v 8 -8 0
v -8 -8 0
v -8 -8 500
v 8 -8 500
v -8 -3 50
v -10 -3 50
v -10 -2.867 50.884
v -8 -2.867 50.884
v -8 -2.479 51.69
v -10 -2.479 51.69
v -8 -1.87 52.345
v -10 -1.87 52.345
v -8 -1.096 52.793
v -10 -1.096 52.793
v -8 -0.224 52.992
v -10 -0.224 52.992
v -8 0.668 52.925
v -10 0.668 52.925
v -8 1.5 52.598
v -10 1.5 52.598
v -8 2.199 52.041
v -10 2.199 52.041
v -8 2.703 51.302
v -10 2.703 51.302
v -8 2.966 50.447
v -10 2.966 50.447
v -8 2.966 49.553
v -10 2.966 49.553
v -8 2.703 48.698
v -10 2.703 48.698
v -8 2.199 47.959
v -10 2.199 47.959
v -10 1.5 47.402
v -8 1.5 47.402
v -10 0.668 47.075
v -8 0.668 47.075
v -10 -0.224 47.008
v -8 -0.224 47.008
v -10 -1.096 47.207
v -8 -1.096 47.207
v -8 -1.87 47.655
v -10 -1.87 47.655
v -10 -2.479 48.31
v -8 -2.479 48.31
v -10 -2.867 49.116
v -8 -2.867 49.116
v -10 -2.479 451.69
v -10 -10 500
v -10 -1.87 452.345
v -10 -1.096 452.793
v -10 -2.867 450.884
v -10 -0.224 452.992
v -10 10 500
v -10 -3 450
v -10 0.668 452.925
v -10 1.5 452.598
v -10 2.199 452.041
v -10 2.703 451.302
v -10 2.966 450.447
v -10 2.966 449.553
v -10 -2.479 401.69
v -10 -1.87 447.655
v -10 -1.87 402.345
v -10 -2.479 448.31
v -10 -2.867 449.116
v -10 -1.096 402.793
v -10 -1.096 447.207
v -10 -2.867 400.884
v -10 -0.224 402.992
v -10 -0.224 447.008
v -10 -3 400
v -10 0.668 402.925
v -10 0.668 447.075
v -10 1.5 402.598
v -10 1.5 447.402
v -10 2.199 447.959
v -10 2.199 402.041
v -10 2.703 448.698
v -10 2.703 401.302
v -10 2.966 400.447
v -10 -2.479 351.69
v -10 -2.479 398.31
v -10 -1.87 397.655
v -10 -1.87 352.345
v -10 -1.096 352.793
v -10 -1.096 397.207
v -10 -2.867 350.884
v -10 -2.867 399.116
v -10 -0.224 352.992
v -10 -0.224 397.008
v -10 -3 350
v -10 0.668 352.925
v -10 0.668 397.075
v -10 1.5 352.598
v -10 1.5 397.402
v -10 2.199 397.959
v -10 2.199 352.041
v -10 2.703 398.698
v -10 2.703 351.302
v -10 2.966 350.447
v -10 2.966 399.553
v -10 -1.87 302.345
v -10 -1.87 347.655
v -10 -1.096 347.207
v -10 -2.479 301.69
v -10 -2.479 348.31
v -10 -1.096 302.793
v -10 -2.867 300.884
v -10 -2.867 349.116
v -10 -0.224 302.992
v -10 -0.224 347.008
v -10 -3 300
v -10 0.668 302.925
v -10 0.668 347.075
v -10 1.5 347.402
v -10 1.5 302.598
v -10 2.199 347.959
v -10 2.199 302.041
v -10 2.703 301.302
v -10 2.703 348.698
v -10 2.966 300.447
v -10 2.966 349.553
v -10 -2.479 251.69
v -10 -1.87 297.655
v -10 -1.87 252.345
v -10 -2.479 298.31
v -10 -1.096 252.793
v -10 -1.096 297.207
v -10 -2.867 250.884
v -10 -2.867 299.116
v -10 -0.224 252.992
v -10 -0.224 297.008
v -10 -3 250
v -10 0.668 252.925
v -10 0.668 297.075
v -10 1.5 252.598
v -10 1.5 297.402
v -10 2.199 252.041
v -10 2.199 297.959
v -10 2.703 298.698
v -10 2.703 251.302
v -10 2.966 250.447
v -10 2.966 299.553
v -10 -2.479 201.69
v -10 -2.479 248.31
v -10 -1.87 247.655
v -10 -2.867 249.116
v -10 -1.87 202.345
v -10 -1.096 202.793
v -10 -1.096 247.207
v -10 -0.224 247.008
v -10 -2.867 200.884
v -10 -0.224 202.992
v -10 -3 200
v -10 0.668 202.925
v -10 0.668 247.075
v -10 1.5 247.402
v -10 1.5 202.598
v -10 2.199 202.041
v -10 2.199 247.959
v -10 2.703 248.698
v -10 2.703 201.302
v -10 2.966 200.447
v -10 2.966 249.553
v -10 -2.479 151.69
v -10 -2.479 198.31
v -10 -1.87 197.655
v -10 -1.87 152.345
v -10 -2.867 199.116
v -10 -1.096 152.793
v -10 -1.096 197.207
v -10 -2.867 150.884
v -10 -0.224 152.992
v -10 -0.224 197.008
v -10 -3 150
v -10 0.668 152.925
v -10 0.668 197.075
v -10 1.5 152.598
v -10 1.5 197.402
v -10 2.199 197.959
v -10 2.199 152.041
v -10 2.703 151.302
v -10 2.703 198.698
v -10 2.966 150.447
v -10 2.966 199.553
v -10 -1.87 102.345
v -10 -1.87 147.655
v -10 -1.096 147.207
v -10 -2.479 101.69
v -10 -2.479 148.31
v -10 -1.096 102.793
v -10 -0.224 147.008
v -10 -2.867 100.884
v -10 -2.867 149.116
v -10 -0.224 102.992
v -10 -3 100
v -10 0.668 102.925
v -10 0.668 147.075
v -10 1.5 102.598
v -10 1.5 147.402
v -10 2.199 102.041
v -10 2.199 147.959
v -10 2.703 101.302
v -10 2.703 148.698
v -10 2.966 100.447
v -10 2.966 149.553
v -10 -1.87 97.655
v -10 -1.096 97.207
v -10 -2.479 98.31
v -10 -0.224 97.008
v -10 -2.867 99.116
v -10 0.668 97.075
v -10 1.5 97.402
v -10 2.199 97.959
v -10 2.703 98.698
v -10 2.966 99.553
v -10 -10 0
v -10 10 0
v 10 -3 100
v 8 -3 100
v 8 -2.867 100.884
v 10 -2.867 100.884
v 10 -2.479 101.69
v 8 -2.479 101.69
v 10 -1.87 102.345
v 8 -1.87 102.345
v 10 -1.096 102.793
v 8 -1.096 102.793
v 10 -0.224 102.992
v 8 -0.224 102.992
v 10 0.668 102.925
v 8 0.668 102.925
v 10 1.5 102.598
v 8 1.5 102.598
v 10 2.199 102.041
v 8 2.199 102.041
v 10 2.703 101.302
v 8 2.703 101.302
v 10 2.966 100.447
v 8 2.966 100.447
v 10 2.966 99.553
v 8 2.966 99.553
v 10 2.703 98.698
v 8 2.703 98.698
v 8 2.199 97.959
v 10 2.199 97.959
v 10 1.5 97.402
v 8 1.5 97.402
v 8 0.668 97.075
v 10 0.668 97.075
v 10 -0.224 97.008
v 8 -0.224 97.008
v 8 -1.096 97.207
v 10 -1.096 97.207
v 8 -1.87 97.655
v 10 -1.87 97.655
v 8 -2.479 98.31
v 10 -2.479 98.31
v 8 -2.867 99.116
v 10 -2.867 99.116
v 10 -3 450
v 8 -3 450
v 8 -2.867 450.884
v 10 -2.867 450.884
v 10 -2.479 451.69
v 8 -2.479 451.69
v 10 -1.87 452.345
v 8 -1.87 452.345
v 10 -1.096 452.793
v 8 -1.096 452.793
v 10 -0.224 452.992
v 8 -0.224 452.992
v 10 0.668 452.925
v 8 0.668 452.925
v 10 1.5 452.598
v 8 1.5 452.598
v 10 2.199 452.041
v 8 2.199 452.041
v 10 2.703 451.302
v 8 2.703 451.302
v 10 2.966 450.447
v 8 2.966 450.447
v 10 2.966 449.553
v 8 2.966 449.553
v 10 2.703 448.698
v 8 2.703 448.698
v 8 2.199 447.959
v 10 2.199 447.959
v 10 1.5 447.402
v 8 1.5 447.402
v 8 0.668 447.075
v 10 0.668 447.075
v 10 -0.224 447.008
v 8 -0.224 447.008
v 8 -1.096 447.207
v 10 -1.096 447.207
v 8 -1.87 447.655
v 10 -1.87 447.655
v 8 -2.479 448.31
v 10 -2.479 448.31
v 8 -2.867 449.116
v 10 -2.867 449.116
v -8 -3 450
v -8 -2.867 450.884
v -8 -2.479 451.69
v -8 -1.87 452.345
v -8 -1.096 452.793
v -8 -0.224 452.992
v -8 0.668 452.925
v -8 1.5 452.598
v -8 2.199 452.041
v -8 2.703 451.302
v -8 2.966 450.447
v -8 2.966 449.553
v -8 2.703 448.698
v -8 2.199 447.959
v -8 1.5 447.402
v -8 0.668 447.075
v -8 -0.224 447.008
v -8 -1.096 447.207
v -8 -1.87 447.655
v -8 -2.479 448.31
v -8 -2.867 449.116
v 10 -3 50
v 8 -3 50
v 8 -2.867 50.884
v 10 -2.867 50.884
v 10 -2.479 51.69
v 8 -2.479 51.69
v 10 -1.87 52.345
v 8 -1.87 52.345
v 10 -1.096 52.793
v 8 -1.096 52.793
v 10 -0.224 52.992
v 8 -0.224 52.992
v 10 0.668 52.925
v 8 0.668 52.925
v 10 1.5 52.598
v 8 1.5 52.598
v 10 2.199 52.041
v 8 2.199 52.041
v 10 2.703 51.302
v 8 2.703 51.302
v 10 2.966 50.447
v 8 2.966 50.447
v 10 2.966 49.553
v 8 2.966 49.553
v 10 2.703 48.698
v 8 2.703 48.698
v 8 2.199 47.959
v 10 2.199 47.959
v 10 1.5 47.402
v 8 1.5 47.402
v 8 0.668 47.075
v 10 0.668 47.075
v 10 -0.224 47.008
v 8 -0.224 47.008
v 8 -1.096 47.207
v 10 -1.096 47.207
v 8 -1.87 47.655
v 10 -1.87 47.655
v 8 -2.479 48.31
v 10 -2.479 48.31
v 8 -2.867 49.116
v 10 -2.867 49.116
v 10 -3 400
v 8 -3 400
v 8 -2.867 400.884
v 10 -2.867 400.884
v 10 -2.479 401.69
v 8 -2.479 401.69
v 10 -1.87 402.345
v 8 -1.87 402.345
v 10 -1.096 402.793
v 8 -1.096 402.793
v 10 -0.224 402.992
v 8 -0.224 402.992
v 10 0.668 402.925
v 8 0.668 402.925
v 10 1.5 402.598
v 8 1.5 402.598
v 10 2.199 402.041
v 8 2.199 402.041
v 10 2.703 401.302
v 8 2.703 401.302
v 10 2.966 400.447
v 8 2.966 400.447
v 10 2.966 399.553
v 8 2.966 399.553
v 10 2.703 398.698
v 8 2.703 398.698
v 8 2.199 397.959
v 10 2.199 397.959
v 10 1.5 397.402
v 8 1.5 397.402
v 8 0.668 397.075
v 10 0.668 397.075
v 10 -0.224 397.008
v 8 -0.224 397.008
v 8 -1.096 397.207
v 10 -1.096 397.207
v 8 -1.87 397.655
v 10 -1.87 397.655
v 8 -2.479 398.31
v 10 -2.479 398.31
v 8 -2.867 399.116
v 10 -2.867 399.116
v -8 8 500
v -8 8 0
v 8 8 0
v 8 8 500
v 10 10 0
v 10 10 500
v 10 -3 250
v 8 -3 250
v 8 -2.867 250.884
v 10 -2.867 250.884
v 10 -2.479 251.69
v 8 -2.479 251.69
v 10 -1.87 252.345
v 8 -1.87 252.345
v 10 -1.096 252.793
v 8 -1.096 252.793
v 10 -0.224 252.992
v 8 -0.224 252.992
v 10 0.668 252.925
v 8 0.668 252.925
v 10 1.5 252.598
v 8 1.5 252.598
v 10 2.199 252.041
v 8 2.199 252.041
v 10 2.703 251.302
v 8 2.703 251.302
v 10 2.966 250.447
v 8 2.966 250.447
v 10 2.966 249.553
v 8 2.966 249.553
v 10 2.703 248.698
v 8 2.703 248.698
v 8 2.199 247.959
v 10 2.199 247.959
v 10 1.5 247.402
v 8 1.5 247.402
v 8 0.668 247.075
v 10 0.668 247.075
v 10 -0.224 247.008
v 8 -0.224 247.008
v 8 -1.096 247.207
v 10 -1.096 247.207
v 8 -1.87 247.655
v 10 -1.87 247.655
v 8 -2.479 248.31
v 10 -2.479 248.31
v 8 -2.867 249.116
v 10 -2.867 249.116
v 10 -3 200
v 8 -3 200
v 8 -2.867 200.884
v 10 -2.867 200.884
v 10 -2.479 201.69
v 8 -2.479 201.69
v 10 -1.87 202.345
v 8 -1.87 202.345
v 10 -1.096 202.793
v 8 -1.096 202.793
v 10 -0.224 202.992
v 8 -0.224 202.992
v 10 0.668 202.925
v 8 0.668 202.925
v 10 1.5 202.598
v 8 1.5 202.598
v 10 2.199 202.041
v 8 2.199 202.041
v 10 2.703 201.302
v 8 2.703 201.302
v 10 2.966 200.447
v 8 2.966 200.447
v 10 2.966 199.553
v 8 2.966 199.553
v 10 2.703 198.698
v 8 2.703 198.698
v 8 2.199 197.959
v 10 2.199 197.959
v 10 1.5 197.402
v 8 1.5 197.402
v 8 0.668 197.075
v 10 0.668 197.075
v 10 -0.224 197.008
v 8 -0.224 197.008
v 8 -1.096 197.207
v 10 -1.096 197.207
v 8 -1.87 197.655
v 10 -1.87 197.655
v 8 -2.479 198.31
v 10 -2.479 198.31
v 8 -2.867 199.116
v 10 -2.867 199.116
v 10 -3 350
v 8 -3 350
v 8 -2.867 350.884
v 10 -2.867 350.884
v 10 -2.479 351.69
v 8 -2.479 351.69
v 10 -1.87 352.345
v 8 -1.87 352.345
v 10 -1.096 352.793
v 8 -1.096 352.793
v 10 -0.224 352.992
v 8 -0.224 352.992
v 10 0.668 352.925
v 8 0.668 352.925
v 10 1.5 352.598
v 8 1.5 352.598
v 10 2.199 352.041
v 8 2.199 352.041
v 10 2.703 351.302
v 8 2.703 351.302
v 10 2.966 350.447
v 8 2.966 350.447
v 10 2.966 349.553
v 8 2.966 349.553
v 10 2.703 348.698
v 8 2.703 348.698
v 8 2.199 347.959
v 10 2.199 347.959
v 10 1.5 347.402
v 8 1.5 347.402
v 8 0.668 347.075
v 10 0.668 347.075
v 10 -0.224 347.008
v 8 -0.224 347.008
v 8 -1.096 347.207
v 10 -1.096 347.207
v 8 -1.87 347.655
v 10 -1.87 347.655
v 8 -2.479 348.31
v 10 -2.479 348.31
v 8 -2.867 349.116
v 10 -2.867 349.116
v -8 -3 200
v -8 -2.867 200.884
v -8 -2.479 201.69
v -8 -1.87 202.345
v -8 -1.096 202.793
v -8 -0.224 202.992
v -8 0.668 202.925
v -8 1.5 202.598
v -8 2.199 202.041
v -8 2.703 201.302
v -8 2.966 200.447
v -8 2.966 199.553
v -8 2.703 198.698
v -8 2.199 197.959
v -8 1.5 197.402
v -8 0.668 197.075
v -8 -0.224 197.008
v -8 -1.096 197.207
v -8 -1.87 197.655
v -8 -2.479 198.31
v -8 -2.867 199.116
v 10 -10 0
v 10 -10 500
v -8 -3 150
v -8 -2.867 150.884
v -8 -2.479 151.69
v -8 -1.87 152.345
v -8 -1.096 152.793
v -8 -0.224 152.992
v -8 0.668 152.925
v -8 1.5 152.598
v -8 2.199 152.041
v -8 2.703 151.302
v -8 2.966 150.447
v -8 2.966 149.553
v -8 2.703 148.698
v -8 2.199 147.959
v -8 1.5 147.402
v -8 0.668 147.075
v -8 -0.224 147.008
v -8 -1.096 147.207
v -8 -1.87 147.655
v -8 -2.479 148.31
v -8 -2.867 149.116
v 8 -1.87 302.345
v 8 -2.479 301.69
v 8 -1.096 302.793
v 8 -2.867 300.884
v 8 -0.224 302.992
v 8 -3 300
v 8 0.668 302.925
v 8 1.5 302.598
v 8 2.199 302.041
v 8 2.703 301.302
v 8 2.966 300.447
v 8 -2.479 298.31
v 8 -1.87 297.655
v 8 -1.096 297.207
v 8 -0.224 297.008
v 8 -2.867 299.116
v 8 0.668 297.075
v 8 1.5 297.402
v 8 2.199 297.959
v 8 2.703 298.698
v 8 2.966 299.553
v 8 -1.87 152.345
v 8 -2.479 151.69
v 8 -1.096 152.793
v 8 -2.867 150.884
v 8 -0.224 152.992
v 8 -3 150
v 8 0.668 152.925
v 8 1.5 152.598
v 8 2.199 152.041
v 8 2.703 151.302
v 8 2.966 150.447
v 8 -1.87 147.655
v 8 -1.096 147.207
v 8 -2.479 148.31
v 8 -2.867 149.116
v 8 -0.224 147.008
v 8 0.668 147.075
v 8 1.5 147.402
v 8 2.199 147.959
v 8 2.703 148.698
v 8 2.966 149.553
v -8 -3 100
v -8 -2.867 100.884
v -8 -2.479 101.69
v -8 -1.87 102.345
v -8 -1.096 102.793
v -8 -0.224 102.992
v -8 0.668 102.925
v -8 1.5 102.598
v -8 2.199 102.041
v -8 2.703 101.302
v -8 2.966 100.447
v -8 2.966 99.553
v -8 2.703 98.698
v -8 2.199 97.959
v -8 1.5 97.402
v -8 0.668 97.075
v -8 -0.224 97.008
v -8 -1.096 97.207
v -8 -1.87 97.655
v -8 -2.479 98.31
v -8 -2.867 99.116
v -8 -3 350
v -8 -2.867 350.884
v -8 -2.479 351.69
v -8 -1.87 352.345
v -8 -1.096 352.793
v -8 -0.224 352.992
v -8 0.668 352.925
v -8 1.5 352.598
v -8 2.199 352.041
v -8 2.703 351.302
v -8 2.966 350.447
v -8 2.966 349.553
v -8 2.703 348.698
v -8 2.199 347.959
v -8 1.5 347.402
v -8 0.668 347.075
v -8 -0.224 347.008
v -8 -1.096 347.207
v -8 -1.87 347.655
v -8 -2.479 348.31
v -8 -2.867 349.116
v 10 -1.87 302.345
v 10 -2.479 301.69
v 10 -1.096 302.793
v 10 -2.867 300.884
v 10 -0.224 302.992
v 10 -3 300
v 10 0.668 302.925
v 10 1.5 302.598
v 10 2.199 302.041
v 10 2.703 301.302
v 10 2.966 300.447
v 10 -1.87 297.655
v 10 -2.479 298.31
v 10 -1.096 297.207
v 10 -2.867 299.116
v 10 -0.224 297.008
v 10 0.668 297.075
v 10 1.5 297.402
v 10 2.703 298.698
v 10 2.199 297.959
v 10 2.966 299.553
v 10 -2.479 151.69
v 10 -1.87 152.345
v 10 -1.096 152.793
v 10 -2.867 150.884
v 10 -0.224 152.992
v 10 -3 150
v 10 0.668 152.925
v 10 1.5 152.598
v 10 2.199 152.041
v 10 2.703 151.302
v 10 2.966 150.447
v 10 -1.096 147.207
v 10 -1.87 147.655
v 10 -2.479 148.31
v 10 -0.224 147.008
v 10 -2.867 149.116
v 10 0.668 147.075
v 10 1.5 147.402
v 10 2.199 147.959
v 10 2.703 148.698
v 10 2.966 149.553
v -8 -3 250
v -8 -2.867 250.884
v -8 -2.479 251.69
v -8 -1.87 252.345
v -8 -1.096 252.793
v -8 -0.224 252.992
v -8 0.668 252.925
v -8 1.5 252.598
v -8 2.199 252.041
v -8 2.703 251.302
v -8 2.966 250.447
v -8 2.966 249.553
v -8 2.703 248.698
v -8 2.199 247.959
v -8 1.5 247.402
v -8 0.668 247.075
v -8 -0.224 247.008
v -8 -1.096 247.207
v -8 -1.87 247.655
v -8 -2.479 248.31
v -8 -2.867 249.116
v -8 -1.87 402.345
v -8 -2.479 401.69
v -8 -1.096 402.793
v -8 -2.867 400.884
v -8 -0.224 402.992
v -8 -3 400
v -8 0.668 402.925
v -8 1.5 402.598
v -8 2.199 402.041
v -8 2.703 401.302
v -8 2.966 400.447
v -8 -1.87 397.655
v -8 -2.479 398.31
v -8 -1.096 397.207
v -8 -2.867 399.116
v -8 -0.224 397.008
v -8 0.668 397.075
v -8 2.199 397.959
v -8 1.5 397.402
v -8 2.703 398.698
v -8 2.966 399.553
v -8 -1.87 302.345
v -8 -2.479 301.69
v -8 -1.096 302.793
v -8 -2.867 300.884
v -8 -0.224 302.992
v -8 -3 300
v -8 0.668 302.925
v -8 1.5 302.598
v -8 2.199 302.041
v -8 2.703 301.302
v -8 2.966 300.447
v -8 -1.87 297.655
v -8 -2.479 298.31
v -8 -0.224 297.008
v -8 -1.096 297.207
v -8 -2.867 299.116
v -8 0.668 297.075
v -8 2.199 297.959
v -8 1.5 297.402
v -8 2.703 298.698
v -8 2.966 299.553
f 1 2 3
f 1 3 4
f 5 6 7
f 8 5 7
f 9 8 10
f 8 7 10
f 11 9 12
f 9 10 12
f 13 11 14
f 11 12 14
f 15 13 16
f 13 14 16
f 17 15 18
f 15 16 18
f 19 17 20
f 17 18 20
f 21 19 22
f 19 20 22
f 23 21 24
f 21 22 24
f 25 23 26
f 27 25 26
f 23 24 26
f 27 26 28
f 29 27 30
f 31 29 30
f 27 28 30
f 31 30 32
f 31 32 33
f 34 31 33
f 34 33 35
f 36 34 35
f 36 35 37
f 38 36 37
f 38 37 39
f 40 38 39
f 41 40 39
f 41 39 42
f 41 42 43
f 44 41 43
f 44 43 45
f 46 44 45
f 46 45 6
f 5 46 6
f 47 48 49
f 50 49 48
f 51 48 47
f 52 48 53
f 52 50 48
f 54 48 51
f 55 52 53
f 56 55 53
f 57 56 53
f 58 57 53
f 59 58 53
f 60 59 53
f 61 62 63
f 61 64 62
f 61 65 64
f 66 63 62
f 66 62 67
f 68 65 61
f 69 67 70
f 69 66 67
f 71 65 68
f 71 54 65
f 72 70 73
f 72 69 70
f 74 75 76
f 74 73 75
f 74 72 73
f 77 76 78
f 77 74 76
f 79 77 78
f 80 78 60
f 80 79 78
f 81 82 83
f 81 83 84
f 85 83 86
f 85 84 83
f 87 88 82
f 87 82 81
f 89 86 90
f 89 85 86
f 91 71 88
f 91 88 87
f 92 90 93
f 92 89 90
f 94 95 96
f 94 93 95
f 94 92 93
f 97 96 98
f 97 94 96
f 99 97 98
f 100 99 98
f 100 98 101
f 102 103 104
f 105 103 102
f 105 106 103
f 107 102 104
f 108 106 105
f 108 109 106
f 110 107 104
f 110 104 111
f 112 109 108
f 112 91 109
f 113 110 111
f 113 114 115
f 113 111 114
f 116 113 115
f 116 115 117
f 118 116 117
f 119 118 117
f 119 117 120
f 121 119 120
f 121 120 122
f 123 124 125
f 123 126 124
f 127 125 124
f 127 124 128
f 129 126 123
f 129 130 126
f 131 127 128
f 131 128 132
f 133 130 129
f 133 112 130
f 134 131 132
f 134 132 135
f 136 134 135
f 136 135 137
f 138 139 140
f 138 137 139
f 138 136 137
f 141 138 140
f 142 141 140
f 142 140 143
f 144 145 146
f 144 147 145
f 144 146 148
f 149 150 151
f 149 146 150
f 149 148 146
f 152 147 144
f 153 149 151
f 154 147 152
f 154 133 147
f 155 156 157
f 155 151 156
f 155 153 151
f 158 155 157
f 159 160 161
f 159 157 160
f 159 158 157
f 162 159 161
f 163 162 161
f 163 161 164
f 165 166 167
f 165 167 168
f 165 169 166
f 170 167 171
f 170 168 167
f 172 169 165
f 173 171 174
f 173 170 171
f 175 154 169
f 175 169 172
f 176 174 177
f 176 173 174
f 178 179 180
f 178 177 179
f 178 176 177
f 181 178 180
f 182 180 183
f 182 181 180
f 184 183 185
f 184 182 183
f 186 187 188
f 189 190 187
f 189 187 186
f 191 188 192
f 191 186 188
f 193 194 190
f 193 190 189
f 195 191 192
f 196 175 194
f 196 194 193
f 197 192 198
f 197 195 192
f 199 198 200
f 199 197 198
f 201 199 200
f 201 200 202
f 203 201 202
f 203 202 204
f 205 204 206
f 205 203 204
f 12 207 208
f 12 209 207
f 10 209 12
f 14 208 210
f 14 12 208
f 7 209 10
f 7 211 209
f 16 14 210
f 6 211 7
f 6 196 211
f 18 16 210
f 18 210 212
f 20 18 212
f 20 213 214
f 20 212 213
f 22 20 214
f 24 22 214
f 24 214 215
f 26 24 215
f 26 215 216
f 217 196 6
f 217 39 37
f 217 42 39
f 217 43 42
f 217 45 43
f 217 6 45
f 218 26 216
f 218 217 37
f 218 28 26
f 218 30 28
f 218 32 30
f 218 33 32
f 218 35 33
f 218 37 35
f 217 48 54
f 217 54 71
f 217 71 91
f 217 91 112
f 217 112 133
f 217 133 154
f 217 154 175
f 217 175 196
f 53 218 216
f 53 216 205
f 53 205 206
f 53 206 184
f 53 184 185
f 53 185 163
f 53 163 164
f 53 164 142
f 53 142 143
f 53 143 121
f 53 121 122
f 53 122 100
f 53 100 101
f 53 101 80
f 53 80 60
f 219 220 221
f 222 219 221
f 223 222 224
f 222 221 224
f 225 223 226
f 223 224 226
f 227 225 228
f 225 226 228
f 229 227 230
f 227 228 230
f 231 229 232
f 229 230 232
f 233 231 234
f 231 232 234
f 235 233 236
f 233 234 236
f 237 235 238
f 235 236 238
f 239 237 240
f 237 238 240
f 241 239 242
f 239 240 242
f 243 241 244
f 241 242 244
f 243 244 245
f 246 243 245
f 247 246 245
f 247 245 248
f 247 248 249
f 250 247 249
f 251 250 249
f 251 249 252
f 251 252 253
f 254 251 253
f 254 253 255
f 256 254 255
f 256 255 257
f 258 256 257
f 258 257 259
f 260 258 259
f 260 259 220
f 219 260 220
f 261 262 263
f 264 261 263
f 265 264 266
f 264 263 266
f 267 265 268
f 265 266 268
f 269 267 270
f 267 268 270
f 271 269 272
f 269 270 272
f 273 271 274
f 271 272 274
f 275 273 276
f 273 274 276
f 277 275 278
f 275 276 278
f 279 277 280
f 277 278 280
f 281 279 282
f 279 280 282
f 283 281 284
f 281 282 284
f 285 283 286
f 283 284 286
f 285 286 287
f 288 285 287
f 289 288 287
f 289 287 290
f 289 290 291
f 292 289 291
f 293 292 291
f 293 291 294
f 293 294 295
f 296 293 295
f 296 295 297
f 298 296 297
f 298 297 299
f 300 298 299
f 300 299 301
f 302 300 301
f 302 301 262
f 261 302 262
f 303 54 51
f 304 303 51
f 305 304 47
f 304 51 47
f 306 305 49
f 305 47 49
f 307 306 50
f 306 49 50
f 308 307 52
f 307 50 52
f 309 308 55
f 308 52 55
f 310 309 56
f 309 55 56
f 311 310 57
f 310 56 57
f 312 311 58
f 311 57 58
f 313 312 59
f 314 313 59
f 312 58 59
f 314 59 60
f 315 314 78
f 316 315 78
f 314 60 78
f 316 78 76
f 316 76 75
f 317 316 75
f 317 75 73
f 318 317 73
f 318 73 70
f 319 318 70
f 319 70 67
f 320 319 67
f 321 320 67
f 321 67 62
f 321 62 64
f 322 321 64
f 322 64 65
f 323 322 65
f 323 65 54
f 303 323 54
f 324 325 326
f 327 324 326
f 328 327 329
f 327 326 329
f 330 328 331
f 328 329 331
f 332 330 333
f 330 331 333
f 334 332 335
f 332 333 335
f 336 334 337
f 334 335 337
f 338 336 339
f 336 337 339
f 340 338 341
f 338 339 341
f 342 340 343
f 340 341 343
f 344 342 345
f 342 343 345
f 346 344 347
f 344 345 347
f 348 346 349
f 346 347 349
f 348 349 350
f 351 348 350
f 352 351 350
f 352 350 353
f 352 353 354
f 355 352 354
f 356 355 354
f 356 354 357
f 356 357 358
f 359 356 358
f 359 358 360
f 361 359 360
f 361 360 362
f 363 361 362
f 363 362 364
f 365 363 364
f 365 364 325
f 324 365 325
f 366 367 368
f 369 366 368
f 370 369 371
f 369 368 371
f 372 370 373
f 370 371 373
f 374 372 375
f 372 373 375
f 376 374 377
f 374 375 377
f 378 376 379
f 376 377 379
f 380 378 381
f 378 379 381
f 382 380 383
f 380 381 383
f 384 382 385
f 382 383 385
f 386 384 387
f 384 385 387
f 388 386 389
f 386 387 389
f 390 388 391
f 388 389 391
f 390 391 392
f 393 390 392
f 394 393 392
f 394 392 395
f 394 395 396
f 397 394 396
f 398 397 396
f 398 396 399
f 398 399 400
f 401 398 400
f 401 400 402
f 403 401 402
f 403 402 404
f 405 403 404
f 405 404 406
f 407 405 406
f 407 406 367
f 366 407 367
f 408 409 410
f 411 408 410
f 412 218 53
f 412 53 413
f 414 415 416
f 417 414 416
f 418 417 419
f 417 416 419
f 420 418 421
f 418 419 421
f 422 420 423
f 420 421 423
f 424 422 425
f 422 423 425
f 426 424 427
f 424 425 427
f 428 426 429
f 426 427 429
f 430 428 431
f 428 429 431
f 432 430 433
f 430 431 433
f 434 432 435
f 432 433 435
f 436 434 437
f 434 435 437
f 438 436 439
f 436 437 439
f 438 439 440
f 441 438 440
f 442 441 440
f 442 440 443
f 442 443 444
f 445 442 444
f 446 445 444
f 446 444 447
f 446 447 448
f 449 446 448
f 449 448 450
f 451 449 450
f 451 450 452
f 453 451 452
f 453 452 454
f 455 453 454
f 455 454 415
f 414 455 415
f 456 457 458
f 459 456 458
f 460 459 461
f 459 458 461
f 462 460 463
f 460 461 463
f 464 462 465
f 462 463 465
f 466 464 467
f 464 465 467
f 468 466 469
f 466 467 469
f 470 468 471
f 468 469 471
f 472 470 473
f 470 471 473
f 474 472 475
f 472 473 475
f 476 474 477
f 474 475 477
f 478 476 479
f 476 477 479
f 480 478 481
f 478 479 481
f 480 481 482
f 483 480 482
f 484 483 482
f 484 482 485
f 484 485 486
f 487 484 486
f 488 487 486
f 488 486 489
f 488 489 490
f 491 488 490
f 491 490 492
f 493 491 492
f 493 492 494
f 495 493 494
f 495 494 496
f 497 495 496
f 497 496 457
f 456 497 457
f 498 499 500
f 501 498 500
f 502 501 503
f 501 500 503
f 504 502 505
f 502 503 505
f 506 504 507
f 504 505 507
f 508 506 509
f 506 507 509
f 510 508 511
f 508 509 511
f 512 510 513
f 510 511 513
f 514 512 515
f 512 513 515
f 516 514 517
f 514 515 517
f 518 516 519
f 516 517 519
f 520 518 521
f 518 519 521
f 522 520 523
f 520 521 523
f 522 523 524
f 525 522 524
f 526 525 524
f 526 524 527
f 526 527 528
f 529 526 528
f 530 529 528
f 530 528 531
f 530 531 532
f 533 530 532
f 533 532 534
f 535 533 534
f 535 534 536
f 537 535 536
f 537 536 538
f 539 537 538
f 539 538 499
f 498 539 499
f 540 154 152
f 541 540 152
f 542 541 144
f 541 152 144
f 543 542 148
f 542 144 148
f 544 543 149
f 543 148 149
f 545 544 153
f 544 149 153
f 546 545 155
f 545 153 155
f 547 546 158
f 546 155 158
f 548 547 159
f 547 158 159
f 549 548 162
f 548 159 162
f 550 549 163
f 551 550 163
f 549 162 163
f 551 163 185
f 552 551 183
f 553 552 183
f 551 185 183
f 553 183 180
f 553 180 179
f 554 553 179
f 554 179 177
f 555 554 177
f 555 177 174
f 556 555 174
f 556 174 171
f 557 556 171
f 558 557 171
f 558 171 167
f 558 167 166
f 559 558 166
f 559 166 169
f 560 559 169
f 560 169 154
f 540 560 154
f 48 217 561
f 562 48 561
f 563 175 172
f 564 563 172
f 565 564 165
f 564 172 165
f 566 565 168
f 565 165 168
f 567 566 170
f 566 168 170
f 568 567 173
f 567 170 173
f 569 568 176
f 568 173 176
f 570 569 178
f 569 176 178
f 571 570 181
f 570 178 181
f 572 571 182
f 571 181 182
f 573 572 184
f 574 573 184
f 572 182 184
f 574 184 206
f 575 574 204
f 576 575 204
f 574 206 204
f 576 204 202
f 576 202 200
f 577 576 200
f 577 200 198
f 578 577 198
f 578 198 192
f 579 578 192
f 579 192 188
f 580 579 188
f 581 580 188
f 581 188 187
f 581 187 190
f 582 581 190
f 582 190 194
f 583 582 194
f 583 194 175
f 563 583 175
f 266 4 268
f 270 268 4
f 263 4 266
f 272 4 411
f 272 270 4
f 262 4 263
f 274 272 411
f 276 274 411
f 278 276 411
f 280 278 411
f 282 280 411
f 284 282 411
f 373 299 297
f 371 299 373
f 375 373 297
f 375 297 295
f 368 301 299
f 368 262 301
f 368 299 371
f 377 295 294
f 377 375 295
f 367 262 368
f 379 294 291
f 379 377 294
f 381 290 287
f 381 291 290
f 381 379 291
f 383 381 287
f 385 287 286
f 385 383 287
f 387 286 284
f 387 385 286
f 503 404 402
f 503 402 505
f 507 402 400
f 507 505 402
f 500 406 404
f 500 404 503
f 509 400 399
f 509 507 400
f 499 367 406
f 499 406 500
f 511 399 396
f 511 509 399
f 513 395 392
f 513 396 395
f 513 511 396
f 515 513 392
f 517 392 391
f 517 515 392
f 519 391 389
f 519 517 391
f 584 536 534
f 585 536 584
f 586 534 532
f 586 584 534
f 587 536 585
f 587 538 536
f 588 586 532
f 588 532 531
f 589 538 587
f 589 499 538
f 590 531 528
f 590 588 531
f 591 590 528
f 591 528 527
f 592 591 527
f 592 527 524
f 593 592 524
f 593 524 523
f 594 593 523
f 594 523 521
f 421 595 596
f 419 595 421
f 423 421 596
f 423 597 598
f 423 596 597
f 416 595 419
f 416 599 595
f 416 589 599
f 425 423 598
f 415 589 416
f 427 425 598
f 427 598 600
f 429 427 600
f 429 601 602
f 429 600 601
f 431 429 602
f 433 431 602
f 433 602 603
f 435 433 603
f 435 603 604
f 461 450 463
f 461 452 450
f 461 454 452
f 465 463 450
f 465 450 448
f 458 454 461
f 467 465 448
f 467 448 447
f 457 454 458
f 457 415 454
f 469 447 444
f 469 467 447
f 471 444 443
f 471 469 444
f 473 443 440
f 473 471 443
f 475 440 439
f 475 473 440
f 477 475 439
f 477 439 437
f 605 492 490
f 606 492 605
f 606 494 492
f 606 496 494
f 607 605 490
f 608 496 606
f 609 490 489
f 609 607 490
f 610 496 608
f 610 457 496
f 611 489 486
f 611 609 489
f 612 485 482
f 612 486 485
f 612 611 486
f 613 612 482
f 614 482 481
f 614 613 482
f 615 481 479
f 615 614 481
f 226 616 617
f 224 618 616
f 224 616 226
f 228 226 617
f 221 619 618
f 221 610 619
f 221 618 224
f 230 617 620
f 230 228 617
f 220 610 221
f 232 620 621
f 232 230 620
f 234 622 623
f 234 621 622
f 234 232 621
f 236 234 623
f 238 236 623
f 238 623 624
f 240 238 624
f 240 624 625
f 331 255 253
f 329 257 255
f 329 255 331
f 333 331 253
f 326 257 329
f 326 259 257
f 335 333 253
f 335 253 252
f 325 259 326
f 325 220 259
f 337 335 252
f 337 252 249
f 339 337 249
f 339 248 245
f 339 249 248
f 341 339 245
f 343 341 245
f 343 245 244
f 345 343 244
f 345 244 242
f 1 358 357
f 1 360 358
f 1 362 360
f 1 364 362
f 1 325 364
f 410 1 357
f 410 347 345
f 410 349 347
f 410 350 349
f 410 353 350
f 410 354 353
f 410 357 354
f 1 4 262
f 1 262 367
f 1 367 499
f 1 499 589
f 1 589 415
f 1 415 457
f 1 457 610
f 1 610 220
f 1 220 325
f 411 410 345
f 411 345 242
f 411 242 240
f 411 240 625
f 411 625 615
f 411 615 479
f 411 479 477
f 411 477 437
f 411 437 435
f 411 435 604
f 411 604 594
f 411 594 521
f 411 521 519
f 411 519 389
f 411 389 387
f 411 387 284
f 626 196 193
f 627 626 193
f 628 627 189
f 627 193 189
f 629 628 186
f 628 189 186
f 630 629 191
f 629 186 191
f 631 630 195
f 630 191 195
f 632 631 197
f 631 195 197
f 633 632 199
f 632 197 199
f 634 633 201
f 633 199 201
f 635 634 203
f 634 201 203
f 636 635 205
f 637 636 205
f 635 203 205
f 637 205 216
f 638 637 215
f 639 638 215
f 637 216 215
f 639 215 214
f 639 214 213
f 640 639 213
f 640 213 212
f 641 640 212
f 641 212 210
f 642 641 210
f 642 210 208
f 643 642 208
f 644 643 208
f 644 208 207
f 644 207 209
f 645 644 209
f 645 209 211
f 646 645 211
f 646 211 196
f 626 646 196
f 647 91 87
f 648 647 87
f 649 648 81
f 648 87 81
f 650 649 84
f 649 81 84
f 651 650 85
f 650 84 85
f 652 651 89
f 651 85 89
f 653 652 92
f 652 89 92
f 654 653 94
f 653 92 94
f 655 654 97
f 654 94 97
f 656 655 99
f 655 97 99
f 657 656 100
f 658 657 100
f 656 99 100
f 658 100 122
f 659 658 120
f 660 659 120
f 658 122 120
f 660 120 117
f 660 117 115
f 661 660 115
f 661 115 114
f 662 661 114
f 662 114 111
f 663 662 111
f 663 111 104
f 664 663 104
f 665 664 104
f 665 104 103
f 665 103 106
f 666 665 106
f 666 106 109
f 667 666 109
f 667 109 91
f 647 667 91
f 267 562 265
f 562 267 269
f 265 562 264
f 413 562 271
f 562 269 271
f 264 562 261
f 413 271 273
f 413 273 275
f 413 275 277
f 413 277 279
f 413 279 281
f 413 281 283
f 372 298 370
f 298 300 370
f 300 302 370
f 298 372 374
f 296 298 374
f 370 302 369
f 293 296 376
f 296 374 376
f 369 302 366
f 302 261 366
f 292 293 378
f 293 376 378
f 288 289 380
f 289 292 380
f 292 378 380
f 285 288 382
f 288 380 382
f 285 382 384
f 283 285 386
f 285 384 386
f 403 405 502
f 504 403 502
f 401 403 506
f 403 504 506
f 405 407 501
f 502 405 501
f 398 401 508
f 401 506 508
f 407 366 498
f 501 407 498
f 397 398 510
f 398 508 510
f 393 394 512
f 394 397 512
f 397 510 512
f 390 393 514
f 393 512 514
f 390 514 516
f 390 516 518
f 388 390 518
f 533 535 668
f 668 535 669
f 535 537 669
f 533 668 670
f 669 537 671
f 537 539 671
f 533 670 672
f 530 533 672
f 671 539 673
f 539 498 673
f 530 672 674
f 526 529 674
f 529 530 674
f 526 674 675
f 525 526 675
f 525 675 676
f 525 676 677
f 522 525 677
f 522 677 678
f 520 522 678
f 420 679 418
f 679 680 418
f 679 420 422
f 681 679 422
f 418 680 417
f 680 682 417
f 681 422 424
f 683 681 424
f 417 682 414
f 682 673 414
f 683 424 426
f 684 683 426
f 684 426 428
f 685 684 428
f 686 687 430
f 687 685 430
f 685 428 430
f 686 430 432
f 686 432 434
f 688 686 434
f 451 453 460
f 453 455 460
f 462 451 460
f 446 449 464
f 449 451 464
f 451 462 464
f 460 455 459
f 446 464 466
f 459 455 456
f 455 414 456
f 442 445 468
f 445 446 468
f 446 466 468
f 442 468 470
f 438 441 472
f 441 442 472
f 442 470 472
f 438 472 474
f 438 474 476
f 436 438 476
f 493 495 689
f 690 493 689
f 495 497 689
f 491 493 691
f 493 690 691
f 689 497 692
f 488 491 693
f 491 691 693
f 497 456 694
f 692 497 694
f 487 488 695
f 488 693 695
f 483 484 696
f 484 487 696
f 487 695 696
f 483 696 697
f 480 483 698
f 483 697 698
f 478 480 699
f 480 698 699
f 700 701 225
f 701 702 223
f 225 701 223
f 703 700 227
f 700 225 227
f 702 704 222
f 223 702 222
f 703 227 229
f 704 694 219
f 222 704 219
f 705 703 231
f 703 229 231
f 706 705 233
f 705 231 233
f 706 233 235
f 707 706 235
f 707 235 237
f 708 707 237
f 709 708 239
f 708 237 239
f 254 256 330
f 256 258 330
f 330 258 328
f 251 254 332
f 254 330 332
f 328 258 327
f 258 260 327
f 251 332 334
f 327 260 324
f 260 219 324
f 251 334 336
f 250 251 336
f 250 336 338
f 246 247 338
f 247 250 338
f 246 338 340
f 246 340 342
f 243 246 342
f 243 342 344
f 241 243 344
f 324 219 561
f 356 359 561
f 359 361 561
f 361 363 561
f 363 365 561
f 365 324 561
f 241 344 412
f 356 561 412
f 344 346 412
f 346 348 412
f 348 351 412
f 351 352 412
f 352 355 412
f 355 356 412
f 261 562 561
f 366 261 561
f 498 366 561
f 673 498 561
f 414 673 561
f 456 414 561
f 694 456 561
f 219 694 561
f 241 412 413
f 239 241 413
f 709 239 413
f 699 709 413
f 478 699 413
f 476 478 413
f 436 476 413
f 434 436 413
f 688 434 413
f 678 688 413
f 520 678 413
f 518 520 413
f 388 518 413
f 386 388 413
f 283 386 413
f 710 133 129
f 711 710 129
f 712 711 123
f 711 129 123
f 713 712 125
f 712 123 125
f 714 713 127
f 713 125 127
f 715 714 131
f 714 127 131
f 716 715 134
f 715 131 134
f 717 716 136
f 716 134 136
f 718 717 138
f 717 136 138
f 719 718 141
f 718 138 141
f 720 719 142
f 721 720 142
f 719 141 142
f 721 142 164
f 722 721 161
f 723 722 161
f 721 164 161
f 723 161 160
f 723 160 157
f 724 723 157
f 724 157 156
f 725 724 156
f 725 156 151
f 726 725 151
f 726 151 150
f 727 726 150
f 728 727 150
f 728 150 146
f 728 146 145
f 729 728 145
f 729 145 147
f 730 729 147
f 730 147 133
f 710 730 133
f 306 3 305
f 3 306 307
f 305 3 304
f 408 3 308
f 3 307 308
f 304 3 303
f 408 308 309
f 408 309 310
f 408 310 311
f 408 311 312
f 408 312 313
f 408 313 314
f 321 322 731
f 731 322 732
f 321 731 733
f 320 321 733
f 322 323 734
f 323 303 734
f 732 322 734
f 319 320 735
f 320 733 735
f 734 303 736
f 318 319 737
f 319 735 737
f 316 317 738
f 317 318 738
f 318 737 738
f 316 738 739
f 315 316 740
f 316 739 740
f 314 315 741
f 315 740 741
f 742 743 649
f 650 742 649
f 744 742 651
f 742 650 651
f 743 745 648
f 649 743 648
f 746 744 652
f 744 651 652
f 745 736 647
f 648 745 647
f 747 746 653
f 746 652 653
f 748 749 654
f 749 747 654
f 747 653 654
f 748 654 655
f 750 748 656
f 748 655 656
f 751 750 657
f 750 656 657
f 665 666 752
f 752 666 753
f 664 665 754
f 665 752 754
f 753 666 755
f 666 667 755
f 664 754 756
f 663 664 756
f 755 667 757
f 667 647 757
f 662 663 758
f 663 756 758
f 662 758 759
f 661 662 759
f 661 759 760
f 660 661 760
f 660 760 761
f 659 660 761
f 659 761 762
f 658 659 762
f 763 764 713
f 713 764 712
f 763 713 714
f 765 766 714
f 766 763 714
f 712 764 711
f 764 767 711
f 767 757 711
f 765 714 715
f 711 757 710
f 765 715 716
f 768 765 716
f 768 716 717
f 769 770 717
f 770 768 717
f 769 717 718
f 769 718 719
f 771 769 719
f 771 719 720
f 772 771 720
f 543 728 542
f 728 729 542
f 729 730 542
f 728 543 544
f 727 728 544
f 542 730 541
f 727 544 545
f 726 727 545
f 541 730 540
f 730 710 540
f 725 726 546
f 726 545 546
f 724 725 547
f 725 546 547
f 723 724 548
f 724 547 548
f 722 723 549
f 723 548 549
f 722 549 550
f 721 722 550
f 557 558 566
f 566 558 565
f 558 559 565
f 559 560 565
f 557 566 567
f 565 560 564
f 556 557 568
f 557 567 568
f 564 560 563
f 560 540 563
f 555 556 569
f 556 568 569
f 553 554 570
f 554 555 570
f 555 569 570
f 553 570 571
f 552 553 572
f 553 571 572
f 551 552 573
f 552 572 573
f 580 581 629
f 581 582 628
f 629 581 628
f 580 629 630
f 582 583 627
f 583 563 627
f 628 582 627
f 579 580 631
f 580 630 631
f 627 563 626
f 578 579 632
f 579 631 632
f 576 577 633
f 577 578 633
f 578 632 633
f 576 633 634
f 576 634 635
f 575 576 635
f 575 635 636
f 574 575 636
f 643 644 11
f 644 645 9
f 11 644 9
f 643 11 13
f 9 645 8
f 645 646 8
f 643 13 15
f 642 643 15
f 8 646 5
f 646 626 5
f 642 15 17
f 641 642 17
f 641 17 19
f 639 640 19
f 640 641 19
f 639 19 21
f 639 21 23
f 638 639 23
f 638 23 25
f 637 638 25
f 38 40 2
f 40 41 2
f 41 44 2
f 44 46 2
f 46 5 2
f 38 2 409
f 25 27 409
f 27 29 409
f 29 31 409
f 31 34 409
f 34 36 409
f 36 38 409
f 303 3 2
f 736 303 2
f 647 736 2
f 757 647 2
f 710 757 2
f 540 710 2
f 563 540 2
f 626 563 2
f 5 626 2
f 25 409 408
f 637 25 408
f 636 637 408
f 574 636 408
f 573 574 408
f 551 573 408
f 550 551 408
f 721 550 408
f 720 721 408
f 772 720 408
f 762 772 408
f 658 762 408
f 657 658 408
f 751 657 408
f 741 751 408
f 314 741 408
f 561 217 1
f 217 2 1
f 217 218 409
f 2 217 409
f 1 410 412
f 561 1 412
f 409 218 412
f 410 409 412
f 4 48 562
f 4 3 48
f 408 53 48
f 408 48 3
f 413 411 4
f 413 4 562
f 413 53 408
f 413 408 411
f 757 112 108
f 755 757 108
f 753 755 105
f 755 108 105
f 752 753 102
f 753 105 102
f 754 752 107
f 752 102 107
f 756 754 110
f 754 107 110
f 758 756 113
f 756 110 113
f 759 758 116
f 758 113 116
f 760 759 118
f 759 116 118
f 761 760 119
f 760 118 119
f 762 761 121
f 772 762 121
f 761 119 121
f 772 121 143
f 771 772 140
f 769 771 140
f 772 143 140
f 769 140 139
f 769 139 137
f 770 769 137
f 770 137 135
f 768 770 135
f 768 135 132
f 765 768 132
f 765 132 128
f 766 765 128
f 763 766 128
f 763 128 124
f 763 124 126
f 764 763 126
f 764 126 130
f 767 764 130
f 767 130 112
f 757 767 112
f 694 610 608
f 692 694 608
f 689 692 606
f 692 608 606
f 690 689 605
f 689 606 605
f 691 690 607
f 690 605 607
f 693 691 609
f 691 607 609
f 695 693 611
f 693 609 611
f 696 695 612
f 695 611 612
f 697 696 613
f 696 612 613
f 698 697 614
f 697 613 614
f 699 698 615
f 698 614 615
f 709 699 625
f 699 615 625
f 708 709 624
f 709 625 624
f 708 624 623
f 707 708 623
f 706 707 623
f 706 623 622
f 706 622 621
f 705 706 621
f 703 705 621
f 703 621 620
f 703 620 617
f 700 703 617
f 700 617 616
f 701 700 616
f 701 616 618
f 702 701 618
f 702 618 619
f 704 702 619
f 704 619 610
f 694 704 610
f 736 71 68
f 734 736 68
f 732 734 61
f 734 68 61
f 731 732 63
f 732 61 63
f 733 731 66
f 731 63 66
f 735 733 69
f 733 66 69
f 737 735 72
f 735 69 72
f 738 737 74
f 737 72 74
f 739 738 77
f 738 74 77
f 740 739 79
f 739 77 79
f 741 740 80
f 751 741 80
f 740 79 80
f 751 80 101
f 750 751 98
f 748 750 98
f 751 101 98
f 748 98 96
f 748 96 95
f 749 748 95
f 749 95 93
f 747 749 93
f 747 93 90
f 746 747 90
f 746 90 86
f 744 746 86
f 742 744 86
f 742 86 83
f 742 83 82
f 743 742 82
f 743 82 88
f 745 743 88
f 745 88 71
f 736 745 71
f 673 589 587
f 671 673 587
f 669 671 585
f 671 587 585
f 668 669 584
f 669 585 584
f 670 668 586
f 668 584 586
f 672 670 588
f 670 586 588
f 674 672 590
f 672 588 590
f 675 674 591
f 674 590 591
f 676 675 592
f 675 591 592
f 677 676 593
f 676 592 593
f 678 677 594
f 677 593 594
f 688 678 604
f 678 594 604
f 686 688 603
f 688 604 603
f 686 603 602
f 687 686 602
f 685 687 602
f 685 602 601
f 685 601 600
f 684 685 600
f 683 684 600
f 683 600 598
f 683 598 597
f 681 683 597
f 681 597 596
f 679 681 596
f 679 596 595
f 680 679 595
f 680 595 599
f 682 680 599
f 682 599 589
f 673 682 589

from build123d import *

# Parameters (mm, degrees)
SKETCH1_W           = 20
SKETCH1_H           = 20
SKETCH1_W_2         = 16
SKETCH1_H_2         = 16
BOSS_EXTRUDE1_DEPTH = 500
SKETCH3_R           = 3
CUT_EXTRUDE1_DEPTH  = 501.49975025
LPATTERN1_COUNT     = 9
LPATTERN1_PITCH     = 50


with BuildPart() as part:
    # Sketch1 → Boss-Extrude1 (new body)
    with BuildSketch(Plane.XY):
        Rectangle(SKETCH1_W, SKETCH1_H)
        Rectangle(SKETCH1_W_2, SKETCH1_H_2, mode=Mode.SUBTRACT)
    extrude(amount=BOSS_EXTRUDE1_DEPTH)

    # Sketch3 → Cut-Extrude1 (cut, through all)
    with BuildSketch(Plane.ZY.offset(10)):
        with Locations(Location((50, 0, 0), (0, 0, 270))):
            Circle(SKETCH3_R)
    cut_extrude1 = extrude(amount=-CUT_EXTRUDE1_DEPTH, mode=Mode.SUBTRACT)

    # LPattern1: Cut-Extrude1 ×9
    with Locations(*[(0, 0, i * LPATTERN1_PITCH) for i in range(1, LPATTERN1_COUNT)]):
        add(cut_extrude1, mode=Mode.SUBTRACT)


solid = part.part
